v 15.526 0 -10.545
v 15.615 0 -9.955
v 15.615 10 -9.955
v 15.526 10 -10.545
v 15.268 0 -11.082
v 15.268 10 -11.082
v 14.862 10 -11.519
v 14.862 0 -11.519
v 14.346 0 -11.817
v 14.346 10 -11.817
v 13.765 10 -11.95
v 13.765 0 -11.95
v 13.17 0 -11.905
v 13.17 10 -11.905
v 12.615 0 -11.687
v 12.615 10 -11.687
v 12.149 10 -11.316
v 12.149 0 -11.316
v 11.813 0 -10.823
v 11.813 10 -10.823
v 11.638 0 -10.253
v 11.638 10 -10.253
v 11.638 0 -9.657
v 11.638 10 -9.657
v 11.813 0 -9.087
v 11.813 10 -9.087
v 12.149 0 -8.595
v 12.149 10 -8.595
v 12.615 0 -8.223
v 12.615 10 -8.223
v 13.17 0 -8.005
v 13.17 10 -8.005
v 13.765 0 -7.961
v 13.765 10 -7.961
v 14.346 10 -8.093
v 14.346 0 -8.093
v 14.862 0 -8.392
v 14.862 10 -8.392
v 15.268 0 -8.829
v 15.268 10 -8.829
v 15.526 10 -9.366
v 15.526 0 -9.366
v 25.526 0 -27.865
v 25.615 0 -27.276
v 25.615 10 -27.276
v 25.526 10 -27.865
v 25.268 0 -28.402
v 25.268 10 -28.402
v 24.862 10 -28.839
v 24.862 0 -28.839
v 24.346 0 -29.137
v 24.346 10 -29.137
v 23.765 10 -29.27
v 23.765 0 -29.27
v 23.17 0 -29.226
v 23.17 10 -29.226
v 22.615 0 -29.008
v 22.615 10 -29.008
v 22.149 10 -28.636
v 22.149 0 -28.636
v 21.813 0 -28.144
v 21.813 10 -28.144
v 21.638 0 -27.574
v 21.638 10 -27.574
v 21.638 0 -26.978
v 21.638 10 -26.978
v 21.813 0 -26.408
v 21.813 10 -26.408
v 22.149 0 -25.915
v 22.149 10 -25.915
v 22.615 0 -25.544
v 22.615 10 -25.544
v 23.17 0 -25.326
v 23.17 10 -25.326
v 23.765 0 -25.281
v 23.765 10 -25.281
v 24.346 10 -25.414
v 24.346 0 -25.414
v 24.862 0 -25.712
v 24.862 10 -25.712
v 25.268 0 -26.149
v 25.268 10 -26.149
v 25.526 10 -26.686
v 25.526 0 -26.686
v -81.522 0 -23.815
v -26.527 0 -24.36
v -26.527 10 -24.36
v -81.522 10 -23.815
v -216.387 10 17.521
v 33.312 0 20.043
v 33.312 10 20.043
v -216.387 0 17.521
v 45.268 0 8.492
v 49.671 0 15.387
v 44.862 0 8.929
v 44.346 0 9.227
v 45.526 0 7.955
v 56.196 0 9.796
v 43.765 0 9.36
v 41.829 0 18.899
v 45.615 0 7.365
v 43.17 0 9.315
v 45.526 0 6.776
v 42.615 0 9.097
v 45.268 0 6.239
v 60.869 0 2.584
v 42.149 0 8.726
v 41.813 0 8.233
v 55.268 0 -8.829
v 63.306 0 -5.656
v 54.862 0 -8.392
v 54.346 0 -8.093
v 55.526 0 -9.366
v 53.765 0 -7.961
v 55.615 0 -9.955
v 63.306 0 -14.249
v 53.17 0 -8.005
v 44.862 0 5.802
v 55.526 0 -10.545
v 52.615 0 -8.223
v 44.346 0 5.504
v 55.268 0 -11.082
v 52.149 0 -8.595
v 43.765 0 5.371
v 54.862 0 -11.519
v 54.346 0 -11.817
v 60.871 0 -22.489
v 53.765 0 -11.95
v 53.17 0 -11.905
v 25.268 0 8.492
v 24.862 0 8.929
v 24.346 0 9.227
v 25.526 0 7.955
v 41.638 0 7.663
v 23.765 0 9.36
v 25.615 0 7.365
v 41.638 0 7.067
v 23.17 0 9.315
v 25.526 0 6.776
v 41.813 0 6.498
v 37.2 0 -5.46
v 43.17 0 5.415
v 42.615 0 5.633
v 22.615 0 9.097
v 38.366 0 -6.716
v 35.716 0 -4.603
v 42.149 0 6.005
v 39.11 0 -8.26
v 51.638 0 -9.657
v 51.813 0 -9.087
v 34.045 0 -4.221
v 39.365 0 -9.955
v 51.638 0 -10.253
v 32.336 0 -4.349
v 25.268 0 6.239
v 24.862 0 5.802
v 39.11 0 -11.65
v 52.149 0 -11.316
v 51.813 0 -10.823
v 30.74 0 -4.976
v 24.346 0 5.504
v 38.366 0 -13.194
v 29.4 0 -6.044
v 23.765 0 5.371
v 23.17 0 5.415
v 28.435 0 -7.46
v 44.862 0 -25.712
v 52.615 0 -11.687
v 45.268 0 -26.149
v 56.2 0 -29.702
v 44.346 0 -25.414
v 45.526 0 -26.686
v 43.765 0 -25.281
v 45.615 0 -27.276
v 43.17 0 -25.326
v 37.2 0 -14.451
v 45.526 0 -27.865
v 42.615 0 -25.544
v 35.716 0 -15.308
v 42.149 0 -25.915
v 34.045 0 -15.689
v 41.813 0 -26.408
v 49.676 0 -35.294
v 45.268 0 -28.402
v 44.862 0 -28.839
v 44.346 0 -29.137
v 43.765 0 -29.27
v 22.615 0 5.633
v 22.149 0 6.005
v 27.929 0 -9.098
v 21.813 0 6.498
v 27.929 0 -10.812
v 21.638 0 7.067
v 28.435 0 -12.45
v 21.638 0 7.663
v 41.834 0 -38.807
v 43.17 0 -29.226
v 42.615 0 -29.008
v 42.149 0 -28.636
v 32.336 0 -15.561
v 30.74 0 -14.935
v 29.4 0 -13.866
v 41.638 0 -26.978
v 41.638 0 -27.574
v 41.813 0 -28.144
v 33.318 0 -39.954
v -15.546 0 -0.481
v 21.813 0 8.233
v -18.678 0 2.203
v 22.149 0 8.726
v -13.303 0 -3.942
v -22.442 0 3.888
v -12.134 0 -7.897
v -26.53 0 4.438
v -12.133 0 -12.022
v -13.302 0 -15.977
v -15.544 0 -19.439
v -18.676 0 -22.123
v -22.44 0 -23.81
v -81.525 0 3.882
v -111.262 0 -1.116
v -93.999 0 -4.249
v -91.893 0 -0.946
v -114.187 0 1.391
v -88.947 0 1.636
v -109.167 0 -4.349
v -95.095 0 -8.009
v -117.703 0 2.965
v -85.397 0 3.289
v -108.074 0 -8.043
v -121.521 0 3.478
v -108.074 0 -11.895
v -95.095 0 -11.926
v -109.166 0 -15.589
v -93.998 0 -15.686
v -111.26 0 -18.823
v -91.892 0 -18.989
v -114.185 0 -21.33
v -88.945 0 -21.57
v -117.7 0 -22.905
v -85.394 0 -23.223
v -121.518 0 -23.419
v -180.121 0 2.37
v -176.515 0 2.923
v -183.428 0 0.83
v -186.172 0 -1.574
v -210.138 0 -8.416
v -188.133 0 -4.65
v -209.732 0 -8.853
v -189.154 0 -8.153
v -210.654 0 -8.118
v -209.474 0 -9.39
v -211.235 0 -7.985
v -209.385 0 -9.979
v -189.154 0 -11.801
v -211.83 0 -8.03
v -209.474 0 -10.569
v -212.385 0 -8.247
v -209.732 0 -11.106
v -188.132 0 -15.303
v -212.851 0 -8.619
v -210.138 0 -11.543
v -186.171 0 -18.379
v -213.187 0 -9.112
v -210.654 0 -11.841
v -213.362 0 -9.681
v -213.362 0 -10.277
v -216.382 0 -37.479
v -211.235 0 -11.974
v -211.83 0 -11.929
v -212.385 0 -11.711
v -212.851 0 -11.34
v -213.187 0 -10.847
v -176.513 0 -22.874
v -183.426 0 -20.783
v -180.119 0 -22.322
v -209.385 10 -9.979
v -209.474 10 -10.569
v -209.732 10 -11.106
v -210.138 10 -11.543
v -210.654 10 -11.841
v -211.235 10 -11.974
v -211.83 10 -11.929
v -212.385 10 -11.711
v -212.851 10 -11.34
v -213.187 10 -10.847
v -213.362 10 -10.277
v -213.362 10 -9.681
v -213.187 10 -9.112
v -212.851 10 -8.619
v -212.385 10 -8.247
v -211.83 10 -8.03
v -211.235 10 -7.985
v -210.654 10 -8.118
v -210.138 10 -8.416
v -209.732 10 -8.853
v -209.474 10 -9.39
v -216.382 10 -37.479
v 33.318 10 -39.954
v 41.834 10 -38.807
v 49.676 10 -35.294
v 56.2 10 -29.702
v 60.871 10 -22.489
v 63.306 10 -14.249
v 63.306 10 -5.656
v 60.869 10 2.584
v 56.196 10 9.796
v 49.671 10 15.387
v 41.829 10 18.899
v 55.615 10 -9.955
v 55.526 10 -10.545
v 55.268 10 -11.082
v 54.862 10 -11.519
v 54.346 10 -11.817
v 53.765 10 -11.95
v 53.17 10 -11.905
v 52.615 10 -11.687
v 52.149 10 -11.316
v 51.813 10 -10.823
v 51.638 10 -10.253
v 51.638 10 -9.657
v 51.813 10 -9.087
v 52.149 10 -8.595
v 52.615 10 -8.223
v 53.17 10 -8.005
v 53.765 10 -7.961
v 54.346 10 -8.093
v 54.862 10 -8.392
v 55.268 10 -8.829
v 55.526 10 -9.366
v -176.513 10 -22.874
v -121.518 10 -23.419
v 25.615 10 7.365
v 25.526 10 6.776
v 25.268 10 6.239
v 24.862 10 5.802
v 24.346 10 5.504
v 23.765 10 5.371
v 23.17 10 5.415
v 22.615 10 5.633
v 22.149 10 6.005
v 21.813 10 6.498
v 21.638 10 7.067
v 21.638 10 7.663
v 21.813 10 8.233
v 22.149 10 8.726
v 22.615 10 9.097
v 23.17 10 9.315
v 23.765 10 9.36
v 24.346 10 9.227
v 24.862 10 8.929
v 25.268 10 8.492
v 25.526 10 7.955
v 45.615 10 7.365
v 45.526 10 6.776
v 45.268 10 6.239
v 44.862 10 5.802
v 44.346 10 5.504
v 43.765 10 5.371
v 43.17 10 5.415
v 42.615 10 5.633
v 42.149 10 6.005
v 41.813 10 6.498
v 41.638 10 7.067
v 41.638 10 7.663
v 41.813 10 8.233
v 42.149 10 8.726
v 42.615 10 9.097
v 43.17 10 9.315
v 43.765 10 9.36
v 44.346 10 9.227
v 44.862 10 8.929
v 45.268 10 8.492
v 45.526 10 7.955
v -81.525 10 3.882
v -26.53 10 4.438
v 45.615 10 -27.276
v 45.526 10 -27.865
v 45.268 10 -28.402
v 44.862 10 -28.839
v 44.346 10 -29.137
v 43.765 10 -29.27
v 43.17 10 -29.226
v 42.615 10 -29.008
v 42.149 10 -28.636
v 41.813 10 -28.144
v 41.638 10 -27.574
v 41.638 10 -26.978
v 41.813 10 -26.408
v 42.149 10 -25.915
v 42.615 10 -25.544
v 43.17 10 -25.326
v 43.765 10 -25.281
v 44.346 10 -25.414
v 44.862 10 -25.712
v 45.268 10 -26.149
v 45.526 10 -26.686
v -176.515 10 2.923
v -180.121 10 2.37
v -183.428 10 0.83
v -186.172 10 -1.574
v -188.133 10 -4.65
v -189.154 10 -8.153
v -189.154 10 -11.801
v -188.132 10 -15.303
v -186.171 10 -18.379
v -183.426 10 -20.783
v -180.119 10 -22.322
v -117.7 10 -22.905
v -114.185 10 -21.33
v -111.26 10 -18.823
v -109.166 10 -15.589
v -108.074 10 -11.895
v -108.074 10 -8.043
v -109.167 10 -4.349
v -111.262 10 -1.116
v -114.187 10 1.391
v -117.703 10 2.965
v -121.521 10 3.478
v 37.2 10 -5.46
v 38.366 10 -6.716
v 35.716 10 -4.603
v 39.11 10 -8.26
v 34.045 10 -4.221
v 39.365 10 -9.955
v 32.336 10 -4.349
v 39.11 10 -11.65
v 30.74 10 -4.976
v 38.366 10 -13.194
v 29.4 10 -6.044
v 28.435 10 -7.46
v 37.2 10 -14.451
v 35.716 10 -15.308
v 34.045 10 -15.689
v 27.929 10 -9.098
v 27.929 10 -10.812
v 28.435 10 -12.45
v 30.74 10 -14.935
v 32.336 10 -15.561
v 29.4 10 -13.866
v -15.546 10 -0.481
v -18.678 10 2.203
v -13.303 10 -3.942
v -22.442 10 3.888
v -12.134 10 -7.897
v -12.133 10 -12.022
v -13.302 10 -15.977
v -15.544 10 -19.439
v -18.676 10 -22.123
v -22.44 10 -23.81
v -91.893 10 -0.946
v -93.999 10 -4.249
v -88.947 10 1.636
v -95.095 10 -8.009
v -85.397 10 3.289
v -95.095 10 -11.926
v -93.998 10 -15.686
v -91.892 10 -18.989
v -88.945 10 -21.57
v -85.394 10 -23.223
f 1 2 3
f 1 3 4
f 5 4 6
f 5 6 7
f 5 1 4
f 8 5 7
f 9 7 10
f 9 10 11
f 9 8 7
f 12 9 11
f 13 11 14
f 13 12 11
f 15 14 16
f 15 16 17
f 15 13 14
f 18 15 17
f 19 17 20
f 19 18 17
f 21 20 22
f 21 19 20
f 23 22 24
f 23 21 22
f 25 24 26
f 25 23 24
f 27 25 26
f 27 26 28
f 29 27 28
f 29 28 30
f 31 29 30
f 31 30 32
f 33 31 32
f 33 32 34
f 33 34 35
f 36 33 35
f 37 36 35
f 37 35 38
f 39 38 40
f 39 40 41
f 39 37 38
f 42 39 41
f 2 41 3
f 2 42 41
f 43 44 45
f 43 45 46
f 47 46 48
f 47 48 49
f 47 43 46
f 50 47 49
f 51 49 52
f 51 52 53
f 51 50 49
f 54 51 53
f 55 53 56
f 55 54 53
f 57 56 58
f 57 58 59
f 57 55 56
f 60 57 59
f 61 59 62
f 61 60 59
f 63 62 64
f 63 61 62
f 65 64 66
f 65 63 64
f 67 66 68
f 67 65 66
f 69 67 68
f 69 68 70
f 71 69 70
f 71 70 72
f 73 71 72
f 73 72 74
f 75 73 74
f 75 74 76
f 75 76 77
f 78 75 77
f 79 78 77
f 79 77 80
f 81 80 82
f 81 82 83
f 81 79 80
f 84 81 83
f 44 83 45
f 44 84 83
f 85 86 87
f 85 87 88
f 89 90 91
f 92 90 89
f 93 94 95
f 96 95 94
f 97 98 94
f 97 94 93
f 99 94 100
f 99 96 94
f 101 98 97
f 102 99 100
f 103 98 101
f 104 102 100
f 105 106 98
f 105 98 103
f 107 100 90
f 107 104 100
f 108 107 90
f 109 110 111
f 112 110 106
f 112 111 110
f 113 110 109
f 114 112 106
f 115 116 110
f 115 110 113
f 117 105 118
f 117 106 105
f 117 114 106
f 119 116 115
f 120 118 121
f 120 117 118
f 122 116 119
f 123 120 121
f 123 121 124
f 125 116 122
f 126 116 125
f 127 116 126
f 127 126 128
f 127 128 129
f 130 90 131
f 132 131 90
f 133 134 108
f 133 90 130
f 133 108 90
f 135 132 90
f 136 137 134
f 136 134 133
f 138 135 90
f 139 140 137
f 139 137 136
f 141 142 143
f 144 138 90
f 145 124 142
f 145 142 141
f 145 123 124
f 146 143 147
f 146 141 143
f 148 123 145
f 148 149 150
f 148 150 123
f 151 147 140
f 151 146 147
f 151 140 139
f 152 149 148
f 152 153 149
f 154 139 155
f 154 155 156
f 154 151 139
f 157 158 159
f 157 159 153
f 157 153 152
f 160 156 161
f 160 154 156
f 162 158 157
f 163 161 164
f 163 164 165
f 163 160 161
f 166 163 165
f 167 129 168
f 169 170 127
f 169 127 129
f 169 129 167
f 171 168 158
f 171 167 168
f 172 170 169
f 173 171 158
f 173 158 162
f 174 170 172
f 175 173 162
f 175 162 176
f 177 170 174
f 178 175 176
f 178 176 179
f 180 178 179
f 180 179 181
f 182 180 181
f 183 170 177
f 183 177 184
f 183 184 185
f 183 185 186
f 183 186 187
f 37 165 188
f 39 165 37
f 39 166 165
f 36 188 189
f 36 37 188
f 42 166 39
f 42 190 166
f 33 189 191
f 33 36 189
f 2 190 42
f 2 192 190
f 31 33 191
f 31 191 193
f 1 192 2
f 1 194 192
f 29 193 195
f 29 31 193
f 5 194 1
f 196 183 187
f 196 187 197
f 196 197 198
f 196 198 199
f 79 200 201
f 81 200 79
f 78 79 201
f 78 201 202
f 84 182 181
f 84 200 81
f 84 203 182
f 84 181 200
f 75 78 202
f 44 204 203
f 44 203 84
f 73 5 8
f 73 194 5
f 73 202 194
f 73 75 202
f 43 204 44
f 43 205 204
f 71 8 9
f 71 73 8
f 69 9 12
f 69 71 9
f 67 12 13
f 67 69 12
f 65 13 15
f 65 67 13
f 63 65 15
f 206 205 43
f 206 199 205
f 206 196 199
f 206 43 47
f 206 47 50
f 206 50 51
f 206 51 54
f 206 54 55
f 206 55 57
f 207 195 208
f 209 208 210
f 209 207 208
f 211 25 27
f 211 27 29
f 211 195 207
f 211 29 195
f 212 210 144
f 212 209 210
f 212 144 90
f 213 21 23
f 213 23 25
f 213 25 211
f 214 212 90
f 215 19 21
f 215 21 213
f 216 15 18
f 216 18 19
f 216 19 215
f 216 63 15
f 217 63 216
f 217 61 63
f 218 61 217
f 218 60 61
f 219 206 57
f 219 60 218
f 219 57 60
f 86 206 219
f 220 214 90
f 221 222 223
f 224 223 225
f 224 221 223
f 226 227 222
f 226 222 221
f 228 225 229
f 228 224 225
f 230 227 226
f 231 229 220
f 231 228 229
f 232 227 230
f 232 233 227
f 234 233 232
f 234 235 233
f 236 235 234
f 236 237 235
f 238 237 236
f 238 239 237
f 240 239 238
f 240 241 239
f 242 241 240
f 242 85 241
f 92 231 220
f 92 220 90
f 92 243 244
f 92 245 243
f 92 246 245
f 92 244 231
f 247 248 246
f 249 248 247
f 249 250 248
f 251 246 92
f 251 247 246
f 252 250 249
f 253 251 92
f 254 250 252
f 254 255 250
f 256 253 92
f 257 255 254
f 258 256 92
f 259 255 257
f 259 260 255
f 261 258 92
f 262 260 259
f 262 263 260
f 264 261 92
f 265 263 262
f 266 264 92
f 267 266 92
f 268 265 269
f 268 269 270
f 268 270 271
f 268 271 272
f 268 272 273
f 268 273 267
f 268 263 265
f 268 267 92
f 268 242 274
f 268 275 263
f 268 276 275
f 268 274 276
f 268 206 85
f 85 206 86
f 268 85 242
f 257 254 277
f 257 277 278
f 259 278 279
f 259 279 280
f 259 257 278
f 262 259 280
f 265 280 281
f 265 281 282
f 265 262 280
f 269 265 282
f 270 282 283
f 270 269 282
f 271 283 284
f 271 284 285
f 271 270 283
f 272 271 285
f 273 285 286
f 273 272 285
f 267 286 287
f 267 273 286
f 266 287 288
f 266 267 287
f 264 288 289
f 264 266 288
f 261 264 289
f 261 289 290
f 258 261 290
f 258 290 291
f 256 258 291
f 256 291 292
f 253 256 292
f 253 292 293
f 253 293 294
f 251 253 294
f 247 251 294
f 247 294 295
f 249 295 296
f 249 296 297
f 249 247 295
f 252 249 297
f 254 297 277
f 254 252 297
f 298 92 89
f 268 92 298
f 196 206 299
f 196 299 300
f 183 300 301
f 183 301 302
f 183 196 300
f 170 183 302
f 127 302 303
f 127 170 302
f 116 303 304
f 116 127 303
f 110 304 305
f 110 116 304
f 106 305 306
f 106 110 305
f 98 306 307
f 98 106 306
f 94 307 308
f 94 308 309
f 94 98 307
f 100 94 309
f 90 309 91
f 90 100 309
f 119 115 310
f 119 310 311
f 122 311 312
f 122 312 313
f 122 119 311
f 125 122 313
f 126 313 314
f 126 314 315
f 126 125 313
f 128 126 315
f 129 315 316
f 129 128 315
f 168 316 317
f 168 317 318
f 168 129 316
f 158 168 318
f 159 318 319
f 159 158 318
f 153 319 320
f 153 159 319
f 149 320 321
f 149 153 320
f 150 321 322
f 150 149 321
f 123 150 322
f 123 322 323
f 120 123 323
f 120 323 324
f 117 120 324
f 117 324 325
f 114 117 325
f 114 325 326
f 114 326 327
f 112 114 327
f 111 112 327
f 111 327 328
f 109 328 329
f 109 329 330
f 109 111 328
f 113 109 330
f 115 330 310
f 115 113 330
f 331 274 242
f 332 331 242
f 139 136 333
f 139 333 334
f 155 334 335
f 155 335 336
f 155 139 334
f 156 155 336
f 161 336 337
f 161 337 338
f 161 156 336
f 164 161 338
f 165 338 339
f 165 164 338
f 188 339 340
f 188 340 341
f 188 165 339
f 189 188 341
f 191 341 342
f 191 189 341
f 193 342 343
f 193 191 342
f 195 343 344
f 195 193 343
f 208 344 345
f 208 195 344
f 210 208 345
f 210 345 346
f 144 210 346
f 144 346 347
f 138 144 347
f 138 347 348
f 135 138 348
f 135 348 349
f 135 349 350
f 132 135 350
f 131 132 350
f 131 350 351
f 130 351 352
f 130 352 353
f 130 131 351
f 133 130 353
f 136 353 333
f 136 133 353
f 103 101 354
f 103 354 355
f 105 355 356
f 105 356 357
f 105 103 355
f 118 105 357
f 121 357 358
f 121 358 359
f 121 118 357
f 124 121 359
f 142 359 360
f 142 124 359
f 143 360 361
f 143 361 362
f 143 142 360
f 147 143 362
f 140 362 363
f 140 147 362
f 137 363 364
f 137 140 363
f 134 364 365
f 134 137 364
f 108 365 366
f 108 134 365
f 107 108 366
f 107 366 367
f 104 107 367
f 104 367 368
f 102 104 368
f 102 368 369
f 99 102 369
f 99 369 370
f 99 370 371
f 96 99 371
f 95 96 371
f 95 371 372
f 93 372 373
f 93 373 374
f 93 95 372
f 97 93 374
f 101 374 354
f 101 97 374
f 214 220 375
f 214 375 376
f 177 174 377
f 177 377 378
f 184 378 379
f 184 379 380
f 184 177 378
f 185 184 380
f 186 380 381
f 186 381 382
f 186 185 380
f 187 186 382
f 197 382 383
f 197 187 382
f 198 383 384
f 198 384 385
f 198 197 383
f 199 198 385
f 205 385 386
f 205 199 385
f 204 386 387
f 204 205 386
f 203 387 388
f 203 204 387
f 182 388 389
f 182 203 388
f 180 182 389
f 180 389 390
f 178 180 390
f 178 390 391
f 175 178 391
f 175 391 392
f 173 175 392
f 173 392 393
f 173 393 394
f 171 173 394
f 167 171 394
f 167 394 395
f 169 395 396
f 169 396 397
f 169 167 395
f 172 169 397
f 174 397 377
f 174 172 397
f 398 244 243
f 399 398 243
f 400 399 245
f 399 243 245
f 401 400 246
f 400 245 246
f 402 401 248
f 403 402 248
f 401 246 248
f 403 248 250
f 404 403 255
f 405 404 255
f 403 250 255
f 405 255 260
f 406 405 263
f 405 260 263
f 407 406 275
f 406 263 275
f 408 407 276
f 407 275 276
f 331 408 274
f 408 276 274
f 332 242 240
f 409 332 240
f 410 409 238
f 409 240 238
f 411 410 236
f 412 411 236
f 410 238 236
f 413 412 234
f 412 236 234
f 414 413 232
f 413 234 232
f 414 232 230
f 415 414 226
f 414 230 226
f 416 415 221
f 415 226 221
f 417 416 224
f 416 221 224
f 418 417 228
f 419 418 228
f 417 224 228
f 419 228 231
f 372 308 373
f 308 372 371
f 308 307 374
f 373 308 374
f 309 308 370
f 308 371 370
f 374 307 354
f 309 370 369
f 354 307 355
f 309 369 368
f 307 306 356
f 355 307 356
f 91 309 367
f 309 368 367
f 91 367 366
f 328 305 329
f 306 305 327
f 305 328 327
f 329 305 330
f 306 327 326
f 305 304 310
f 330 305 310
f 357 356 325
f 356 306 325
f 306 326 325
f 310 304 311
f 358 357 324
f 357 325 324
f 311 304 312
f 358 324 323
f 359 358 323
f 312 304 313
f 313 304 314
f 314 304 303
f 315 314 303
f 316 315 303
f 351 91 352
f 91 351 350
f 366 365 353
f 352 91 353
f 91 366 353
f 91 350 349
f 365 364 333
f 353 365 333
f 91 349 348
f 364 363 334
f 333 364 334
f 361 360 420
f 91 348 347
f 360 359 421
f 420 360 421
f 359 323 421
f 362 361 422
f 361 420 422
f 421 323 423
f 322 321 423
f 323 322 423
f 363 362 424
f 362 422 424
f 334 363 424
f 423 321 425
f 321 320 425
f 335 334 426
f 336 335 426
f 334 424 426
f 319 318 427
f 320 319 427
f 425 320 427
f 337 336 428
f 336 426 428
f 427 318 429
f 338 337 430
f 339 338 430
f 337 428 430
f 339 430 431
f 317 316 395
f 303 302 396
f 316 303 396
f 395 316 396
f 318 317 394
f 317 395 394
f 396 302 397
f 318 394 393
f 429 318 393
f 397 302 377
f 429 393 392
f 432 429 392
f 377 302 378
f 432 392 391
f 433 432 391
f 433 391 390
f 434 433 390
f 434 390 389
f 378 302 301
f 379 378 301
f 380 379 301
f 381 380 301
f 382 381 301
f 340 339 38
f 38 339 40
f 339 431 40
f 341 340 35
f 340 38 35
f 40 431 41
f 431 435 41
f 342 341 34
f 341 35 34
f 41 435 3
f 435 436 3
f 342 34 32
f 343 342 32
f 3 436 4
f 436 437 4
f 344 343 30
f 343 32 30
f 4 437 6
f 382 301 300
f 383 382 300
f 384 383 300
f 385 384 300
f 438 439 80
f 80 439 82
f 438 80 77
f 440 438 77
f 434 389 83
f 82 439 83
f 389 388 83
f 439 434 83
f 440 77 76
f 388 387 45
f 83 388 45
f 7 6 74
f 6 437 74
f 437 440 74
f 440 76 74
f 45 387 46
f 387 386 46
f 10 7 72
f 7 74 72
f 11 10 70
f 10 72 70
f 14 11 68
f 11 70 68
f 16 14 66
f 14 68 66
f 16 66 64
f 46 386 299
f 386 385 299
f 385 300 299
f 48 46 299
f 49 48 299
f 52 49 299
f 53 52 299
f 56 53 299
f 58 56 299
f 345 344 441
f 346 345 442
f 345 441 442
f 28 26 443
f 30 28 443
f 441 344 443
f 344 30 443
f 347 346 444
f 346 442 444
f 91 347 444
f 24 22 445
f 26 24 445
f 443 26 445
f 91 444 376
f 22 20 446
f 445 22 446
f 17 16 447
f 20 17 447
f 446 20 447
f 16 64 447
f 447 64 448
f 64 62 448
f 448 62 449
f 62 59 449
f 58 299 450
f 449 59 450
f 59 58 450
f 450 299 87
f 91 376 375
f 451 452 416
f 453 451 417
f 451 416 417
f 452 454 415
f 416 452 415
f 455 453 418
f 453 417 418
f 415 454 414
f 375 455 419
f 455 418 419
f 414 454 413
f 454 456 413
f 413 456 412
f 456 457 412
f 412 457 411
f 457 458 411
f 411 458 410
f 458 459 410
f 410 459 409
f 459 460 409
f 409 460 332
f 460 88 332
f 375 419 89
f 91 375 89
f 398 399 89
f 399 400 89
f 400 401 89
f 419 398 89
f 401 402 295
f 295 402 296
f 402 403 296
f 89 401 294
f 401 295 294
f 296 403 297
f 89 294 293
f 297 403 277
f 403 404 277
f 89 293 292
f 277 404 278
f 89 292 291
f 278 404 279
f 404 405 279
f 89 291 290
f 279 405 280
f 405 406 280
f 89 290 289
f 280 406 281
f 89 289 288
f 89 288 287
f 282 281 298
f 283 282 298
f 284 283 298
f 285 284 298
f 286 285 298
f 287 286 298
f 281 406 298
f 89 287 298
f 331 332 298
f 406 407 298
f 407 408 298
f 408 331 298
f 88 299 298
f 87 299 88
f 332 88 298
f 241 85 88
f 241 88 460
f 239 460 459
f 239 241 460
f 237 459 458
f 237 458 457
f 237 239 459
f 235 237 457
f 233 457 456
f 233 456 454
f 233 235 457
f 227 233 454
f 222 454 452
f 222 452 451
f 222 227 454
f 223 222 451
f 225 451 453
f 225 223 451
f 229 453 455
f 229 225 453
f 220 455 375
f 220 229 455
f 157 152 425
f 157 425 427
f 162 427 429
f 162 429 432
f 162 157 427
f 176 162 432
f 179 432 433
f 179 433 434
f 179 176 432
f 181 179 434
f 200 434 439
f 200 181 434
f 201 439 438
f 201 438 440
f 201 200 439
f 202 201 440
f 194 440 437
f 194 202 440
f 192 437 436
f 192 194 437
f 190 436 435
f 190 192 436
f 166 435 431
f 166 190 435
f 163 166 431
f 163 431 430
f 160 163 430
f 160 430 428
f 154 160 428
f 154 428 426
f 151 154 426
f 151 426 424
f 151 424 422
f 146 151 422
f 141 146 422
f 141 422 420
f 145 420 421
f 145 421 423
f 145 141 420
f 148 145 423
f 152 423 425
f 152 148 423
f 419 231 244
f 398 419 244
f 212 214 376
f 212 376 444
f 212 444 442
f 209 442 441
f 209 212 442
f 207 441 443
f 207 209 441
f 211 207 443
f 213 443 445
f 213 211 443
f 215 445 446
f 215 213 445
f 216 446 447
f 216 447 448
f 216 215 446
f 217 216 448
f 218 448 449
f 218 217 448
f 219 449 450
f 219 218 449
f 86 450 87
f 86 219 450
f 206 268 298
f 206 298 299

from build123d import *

# Parameters (mm, degrees)
SKETCH1_R           = 5.75
SKETCH1_R_2         = 2
BOSS_EXTRUDE1_DEPTH = 10


with BuildPart() as part:
    # Sketch1 → Boss-Extrude1 (new body)
    with BuildSketch(Plane(origin=(0, 0, 0), x_dir=(1, 0, 0), z_dir=(0, 1, 0))):
        with BuildLine():
            Line((-216.382104852, 37.479356926), (33.317969978, 39.953751753))
            ThreePointArc((33.317969978, 39.953751753), (63.615239274, 9.952328714), (33.312178481, -20.043244588))
            Line((33.312178481, -20.043244588), (-216.38741399, -17.520642817))
            Line((-216.38741399, -17.520642817), (-216.382104852, 37.479356926))
        make_face()
        with Locations((33.615239414, 9.955224607)):
            Circle(SKETCH1_R, mode=Mode.SUBTRACT)
        with Locations((53.615239414, 9.955224607)):
            Circle(SKETCH1_R_2, mode=Mode.SUBTRACT)
        with Locations((43.615239414, -7.365283468)):
            Circle(SKETCH1_R_2, mode=Mode.SUBTRACT)
        with Locations((23.615239414, -7.365283468)):
            Circle(SKETCH1_R_2, mode=Mode.SUBTRACT)
        with Locations((13.615239414, 9.955224607)):
            Circle(SKETCH1_R_2, mode=Mode.SUBTRACT)
        with Locations((23.615239414, 27.275732683)):
            Circle(SKETCH1_R_2, mode=Mode.SUBTRACT)
        with Locations((43.615239414, 27.275732683)):
            Circle(SKETCH1_R_2, mode=Mode.SUBTRACT)
        with Locations((-211.384759398, 9.979356926)):
            Circle(SKETCH1_R_2, mode=Mode.SUBTRACT)
        with BuildLine():
            Line((-176.512574007, 22.873706291), (-121.518027204, 23.418672976))
            ThreePointArc((-121.518027204, 23.418672976), (-107.935613387, 9.968888481), (-121.52062356, -3.478273548))
            Line((-121.52062356, -3.478273548), (-176.515064128, -2.922689649))
            ThreePointArc((-176.515064128, -2.922689649), (-189.283603246, 9.976740986), (-176.512574007, 22.873706291))
        make_face(mode=Mode.SUBTRACT)
        with BuildLine():
            Line((-81.524666784, -3.882334565), (-26.530226217, -4.437918464))
            ThreePointArc((-26.530226217, -4.437918464), (-11.985090745, 9.959626398), (-26.527446362, 24.359979069))
            Line((-26.527446362, 24.359979069), (-81.521993165, 23.815012384))
            ThreePointArc((-81.521993165, 23.815012384), (-95.234126773, 9.967662409), (-81.524666784, -3.882334565))
        make_face(mode=Mode.SUBTRACT)
    extrude(amount=BOSS_EXTRUDE1_DEPTH)


solid = part.part
